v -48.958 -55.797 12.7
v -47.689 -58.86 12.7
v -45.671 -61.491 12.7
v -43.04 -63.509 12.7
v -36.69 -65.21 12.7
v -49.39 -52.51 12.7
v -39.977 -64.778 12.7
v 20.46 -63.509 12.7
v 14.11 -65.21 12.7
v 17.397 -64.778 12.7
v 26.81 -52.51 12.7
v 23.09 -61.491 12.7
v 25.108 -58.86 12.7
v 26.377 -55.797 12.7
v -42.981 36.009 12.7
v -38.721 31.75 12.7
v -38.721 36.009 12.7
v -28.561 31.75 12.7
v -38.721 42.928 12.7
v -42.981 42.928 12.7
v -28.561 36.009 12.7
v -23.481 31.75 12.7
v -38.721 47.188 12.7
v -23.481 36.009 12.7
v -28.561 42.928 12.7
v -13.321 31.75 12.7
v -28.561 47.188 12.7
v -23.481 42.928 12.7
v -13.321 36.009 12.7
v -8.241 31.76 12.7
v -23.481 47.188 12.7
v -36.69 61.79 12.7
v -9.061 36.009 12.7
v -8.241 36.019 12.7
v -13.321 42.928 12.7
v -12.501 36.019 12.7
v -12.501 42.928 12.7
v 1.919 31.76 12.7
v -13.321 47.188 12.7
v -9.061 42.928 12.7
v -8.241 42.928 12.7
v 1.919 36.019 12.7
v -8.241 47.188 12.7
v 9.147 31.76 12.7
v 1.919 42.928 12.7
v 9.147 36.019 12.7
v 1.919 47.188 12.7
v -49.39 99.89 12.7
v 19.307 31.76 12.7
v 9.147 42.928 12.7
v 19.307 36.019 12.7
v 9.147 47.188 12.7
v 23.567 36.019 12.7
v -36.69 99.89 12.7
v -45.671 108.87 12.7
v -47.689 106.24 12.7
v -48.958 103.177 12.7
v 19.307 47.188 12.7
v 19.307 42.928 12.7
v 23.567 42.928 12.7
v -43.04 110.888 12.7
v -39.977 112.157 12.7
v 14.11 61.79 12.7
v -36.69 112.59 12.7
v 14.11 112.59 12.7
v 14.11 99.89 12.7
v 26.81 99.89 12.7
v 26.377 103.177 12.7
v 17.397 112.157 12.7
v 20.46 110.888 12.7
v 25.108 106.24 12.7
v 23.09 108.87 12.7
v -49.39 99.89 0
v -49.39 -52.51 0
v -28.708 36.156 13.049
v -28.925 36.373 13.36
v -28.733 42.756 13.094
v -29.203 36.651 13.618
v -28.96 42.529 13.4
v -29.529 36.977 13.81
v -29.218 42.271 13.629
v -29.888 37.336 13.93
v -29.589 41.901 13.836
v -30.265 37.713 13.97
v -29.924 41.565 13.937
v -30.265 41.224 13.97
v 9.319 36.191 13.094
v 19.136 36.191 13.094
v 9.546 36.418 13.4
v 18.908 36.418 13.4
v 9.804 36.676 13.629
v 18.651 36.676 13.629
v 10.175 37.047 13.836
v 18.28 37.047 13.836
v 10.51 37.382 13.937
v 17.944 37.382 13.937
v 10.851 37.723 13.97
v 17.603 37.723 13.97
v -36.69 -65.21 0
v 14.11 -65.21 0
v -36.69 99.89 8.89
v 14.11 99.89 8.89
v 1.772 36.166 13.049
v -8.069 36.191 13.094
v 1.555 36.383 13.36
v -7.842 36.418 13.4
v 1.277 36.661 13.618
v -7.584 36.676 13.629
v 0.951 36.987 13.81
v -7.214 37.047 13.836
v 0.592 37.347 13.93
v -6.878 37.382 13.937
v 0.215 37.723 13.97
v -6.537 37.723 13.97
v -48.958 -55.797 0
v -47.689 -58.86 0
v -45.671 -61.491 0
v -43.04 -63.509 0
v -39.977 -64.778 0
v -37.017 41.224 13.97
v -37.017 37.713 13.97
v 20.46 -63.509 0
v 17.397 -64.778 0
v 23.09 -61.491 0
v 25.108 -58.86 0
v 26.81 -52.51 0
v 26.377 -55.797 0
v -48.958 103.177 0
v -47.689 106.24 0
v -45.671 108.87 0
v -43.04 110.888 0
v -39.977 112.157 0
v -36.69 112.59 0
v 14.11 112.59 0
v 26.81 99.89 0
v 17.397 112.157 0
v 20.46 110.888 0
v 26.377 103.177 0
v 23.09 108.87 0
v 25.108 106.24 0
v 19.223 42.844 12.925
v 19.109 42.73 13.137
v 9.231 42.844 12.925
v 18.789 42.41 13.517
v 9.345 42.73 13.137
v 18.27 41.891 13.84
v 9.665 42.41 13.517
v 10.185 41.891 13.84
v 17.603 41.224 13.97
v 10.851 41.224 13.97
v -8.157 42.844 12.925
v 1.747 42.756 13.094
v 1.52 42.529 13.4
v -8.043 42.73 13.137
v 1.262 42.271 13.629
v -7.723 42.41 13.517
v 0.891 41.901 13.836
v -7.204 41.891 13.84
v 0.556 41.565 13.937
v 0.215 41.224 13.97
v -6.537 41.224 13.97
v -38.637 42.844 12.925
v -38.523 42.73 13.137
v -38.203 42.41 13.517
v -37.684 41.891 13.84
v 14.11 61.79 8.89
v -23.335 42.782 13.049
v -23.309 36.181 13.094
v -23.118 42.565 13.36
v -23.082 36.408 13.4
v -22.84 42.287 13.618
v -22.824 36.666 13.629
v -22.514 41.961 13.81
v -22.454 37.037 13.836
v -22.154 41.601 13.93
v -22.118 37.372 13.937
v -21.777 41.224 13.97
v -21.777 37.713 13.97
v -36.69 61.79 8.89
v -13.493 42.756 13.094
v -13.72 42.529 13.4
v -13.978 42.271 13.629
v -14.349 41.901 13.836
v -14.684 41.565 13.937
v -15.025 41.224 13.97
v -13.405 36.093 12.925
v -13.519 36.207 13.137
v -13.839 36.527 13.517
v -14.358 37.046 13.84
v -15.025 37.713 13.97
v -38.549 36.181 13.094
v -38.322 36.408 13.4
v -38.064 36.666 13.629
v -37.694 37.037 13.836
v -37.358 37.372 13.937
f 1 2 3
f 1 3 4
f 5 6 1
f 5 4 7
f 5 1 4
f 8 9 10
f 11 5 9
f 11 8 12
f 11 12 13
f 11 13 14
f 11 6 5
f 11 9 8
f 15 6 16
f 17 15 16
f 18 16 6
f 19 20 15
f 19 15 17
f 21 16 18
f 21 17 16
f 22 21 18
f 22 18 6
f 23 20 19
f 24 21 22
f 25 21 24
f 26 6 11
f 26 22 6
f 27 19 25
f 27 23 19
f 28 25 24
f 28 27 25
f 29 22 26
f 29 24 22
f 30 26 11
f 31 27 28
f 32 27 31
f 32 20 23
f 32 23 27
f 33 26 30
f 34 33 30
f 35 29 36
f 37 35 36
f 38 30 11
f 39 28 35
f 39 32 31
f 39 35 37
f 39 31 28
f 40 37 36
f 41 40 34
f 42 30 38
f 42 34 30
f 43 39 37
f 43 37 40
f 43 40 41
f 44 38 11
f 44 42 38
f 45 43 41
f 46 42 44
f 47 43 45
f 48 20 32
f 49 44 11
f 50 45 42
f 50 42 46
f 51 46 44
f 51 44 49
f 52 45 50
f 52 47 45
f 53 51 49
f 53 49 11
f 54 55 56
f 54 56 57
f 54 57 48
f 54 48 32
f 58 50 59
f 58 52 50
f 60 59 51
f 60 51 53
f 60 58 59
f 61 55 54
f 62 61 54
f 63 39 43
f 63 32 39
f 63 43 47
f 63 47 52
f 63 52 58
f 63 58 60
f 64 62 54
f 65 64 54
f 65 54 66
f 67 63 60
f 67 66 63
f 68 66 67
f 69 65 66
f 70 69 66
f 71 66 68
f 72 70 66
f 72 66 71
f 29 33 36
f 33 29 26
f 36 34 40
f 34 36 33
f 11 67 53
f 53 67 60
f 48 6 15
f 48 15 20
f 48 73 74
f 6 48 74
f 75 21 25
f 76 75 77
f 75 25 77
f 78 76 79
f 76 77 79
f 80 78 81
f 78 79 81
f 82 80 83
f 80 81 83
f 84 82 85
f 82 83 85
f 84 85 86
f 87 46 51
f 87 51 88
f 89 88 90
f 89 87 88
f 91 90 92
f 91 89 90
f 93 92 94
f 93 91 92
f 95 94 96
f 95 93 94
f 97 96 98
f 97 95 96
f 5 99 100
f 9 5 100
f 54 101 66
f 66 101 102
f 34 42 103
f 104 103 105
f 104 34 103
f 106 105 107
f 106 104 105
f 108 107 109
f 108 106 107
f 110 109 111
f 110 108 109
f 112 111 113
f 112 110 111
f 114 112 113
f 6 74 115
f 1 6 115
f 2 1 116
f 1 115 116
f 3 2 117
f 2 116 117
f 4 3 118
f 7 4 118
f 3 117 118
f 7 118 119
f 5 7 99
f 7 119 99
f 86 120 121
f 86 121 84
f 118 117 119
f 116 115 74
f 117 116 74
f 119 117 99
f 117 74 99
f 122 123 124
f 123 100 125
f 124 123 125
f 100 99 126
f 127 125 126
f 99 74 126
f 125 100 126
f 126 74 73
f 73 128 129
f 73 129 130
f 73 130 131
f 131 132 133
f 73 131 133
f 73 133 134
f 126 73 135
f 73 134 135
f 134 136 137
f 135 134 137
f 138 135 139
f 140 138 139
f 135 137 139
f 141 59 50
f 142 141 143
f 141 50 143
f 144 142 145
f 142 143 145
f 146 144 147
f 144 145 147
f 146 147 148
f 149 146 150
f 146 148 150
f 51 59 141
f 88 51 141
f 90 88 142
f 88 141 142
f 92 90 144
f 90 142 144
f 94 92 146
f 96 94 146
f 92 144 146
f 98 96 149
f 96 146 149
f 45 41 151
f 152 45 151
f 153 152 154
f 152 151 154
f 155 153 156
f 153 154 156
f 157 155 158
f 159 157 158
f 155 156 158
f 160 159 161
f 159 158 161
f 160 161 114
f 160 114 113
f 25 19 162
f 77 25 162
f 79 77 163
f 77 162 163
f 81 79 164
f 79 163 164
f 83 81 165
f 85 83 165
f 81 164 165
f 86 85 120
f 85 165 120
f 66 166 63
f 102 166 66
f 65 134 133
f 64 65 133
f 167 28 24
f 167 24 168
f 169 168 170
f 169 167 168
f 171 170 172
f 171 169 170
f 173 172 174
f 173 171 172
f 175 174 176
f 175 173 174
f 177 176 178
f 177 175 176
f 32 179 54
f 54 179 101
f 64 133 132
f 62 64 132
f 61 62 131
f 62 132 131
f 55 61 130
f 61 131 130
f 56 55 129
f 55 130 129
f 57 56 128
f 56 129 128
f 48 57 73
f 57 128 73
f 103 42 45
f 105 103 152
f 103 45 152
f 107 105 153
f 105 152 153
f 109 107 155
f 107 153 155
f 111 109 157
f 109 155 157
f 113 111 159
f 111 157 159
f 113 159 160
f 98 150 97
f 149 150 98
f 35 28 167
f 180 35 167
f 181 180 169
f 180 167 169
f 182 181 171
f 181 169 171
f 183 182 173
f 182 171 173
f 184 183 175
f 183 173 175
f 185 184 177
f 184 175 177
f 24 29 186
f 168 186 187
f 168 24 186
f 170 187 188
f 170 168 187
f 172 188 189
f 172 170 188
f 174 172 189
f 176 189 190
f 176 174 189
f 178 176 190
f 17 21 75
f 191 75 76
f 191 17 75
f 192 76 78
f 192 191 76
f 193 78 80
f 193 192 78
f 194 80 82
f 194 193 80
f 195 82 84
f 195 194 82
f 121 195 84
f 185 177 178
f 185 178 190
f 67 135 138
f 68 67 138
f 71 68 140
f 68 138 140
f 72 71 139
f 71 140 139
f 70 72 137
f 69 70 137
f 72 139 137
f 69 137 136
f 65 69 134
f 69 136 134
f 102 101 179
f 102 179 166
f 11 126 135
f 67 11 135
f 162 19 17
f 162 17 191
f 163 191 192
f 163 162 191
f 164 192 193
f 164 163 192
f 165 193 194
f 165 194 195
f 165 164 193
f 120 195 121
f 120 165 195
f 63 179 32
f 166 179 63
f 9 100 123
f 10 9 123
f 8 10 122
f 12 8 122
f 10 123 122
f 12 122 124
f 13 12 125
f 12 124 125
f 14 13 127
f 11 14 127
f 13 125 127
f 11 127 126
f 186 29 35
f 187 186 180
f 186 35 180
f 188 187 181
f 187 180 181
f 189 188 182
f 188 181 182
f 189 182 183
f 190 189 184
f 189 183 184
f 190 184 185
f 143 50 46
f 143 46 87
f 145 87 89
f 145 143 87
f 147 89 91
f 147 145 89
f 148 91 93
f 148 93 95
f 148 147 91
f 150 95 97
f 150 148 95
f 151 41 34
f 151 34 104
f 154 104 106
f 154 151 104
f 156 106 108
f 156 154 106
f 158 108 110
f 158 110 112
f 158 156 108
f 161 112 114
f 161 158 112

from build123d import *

# Parameters (mm, degrees)
F0_W        = 50.8
F0_H        = 38.1
F1_DEPTH    = 12.7
F2_DEPTH    = 8.89
F3_W        = 10.16
F3_H        = 6.9189891219
F3_H_2      = 6.9088
F4_DEPTH    = 1.27
F5_T1_DEPTH = 18.6794189943
F5_T3_DEPTH = 15.4384081162
F6_T1_DEPTH = 15.4384081162
F6_T3_DEPTH = 18.6794189943
F6_T5_DEPTH = 18.6794189943
F6_T7_DEPTH = 18.6794189943
F6_T9_DEPTH = 15.4282189943


# Not quite as in the source:
# - a fillet or chamfer that OpenCascade refuses, or shapes differently, is made with other operations: its cross-section is extruded or revolved along the edge and cut away or added


with BuildPart() as f1:
    # F0 (on Top) → F1 (new body)
    with BuildSketch(Plane.XY):
        with BuildLine():
            Line((26.8096346408, 46.6933250427), (-49.3903653592, 46.6933250427))
            Line((-49.3903653592, 46.6933250427), (-49.3903653592, -52.5104318142))
            ThreePointArc((-49.3903653592, -52.5104318142), (-45.6706214803, -61.4906879353), (-36.6903653592, -65.2104318142))
            Line((-36.6903653592, -65.2104318142), (14.1096346408, -65.2104318142))
            ThreePointArc((14.1096346408, -65.2104318142), (23.0898907619, -61.4906879353), (26.8096346408, -52.5104318142))
            Line((26.8096346408, -52.5104318142), (26.8096346408, 46.6933250427))
        make_face()
        with BuildLine():
            Line((14.1096346408, 112.5895681858), (-36.6903653592, 112.5895681858))
            ThreePointArc((-36.6903653592, 112.5895681858), (-45.6706214803, 108.8698243069), (-49.3903653592, 99.8895681858))
            Line((-49.3903653592, 99.8895681858), (-49.3903653592, 46.6933250427))
            Line((-49.3903653592, 46.6933250427), (26.8096346408, 46.6933250427))
            Line((26.8096346408, 46.6933250427), (26.8096346408, 99.8895681858))
            ThreePointArc((26.8096346408, 99.8895681858), (23.0898907619, 108.8698243069), (14.1096346408, 112.5895681858))
        make_face()
        with Locations((-11.2903653592, 80.8395681858)):
            Rectangle(F0_W, F0_H, mode=Mode.SUBTRACT)
    extrude(amount=F1_DEPTH)

    # F0 (on Top) → F2 (join)
    with BuildSketch(Plane.XY):
        with Locations((-11.2903653592, 80.8395681858)):
            Rectangle(F0_W, F0_H)
    extrude(amount=F2_DEPTH)

    # F3 (on face) → F4 (join)
    with BuildSketch(Plane.XY.offset(12.7)):
        with Locations((-33.6411841828, 39.4687093794)):
            Rectangle(F3_W, F3_H)
        with Locations((-18.4011841828, 39.4687093794)):
            Rectangle(F3_W, F3_H)
        with Locations((-3.1611841828, 39.4738039404)):
            Rectangle(F3_W, F3_H_2)
        with Locations((14.2273069042, 39.4738039404)):
            Rectangle(F3_W, F3_H_2)
    extrude(amount=F4_DEPTH)

    # F5: fillet of radius 1.778 on 4 edges, made by hand

    # F5_s2 → F5_t1 (cut)
    with BuildSketch(Plane.YZ.offset(-42.9808936799)):
        with BuildLine():
            ThreePointArc((42.9282039404, 12.7), (42.2868783752, 13.6175714644), (41.2243201415, 13.97))
            Line((41.2243201415, 13.97), (42.9282039404, 13.97))
            Line((42.9282039404, 13.97), (42.9282039404, 12.7))
        make_face()
        with BuildLine():
            ThreePointArc((36.0092148185, 12.7), (36.6505403836, 13.6175714644), (37.7130986173, 13.97))
            Line((37.7130986173, 13.97), (36.0092148185, 13.97))
            Line((36.0092148185, 13.97), (36.0092148185, 12.7))
        make_face()
    extrude(amount=F5_T1_DEPTH, mode=Mode.SUBTRACT)

    # F5_s4 → F5_t3 (cut)
    with BuildSketch(Plane.XZ.offset(-47.1879134375)):
        with BuildLine():
            ThreePointArc((-38.7211841828, 12.7), (-38.0798586176, 13.6175714644), (-37.0173003839, 13.97))
            Line((-37.0173003839, 13.97), (-38.7211841828, 13.97))
            Line((-38.7211841828, 13.97), (-38.7211841828, 12.7))
        make_face()
        with BuildLine():
            ThreePointArc((-28.5611841828, 12.7), (-29.2025097479, 13.6175714644), (-30.2650679816, 13.97))
            Line((-30.2650679816, 13.97), (-28.5611841828, 13.97))
            Line((-28.5611841828, 13.97), (-28.5611841828, 12.7))
        make_face()
    extrude(amount=F5_T3_DEPTH, mode=Mode.SUBTRACT)

    # F6: fillet of radius 1.778 on 12 edges, made by hand

    # F6_s2 → F6_t1 (cut)
    with BuildSketch(Plane.XZ.offset(-47.1879134375)):
        with BuildLine():
            ThreePointArc((-23.4811841828, 12.7), (-22.8398586176, 13.6175714644), (-21.7773003839, 13.97))
            Line((-21.7773003839, 13.97), (-23.4811841828, 13.97))
            Line((-23.4811841828, 13.97), (-23.4811841828, 12.7))
        make_face()
        with BuildLine():
            ThreePointArc((-13.3211841828, 12.7), (-13.9625097479, 13.6175714644), (-15.0250679816, 13.97))
            Line((-15.0250679816, 13.97), (-13.3211841828, 13.97))
            Line((-13.3211841828, 13.97), (-13.3211841828, 12.7))
        make_face()
    extrude(amount=F6_T1_DEPTH, mode=Mode.SUBTRACT)

    # F6_s4 → F6_t3 (cut)
    with BuildSketch(Plane.YZ.offset(-27.7408936799)):
        with BuildLine():
            ThreePointArc((36.0092148185, 12.7), (36.6505403836, 13.6175714644), (37.7130986173, 13.97))
            Line((37.7130986173, 13.97), (36.0092148185, 13.97))
            Line((36.0092148185, 13.97), (36.0092148185, 12.7))
        make_face()
        with BuildLine():
            ThreePointArc((42.9282039404, 12.7), (42.2868783752, 13.6175714644), (41.2243201415, 13.97))
            Line((41.2243201415, 13.97), (42.9282039404, 13.97))
            Line((42.9282039404, 13.97), (42.9282039404, 12.7))
        make_face()
    extrude(amount=F6_T3_DEPTH, mode=Mode.SUBTRACT)

    # F6_s6 → F6_t5 (cut)
    with BuildSketch(Plane.YZ.offset(-12.5008936799)):
        with BuildLine():
            ThreePointArc((42.9282039404, 12.7), (42.2868783752, 13.6175714644), (41.2243201415, 13.97))
            Line((41.2243201415, 13.97), (42.9282039404, 13.97))
            Line((42.9282039404, 13.97), (42.9282039404, 12.7))
        make_face()
        with BuildLine():
            ThreePointArc((36.0194039404, 12.7), (36.6607295055, 13.6175714644), (37.7232877392, 13.97))
            Line((37.7232877392, 13.97), (36.0194039404, 13.97))
            Line((36.0194039404, 13.97), (36.0194039404, 12.7))
        make_face()
    extrude(amount=F6_T5_DEPTH, mode=Mode.SUBTRACT)

    # F6_s8 → F6_t7 (cut)
    with BuildSketch(Plane.YZ.offset(4.8875974071)):
        with BuildLine():
            ThreePointArc((42.9282039404, 12.7), (42.2868783752, 13.6175714644), (41.2243201415, 13.97))
            Line((41.2243201415, 13.97), (42.9282039404, 13.97))
            Line((42.9282039404, 13.97), (42.9282039404, 12.7))
        make_face()
        with BuildLine():
            ThreePointArc((36.0194039404, 12.7), (36.6607295055, 13.6175714644), (37.7232877392, 13.97))
            Line((37.7232877392, 13.97), (36.0194039404, 13.97))
            Line((36.0194039404, 13.97), (36.0194039404, 12.7))
        make_face()
    extrude(amount=F6_T7_DEPTH, mode=Mode.SUBTRACT)

    # F6_s10 → F6_t9 (cut)
    with BuildSketch(Plane.XZ.offset(-47.1879134375)):
        with BuildLine():
            ThreePointArc((9.1473069042, 12.7), (9.7886324694, 13.6175714644), (10.8511907031, 13.97))
            Line((10.8511907031, 13.97), (9.1473069042, 13.97))
            Line((9.1473069042, 13.97), (9.1473069042, 12.7))
        make_face()
        with BuildLine():
            ThreePointArc((19.3073069042, 12.7), (18.665981339, 13.6175714644), (17.6034231053, 13.97))
            Line((17.6034231053, 13.97), (19.3073069042, 13.97))
            Line((19.3073069042, 13.97), (19.3073069042, 12.7))
        make_face()
        with BuildLine():
            ThreePointArc((-8.2411841828, 12.7), (-7.5998586176, 13.6175714644), (-6.5373003839, 13.97))
            Line((-6.5373003839, 13.97), (-8.2411841828, 13.97))
            Line((-8.2411841828, 13.97), (-8.2411841828, 12.7))
        make_face()
        with BuildLine():
            ThreePointArc((1.9188158172, 12.7), (1.2774902521, 13.6175714644), (0.2149320184, 13.97))
            Line((0.2149320184, 13.97), (1.9188158172, 13.97))
            Line((1.9188158172, 13.97), (1.9188158172, 12.7))
        make_face()
    extrude(amount=F6_T9_DEPTH, mode=Mode.SUBTRACT)


solid = f1.part
